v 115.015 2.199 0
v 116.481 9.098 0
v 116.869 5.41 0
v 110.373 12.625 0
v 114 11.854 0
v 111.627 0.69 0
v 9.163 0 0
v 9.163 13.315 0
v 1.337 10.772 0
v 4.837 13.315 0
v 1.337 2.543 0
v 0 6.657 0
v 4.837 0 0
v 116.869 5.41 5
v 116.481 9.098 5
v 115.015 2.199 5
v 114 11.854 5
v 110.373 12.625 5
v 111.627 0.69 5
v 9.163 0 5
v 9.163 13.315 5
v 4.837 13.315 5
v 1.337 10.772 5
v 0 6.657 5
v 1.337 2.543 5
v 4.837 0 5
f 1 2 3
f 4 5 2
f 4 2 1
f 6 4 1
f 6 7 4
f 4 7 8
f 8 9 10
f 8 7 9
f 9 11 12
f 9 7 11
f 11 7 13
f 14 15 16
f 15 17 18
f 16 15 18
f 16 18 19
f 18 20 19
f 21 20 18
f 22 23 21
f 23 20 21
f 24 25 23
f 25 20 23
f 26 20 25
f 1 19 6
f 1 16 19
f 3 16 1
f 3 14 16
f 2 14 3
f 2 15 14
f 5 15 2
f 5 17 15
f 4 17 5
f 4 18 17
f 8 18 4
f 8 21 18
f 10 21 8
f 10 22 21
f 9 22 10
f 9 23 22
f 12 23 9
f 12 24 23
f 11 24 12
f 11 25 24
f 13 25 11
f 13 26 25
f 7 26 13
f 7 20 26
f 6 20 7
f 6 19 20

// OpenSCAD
$fn = 32;

// ----------------------------------------------------------------------
// Lever arm: two bosses 14 and 10 mm, 65 mm between centres
// ----------------------------------------------------------------------

// --- parameters (mm) ---
profile_height = 5;       // extrusion height
profile_points = 13;      // points of the closed outline

profile = [[0, 6.657], [1.337, 2.543], [4.837, 0], [9.163, 0], [111.627, 0.69], [115.015, 2.199], [116.869, 5.41], [116.481, 9.098], [114, 11.854], [110.373, 12.625], [9.163, 13.315], [4.837, 13.315], [1.337, 10.772]];  // single closed polygon, 13 points, counter clockwise

// --- the one profile operation ---
linear_extrude(height = profile_height) polygon(points = profile);
